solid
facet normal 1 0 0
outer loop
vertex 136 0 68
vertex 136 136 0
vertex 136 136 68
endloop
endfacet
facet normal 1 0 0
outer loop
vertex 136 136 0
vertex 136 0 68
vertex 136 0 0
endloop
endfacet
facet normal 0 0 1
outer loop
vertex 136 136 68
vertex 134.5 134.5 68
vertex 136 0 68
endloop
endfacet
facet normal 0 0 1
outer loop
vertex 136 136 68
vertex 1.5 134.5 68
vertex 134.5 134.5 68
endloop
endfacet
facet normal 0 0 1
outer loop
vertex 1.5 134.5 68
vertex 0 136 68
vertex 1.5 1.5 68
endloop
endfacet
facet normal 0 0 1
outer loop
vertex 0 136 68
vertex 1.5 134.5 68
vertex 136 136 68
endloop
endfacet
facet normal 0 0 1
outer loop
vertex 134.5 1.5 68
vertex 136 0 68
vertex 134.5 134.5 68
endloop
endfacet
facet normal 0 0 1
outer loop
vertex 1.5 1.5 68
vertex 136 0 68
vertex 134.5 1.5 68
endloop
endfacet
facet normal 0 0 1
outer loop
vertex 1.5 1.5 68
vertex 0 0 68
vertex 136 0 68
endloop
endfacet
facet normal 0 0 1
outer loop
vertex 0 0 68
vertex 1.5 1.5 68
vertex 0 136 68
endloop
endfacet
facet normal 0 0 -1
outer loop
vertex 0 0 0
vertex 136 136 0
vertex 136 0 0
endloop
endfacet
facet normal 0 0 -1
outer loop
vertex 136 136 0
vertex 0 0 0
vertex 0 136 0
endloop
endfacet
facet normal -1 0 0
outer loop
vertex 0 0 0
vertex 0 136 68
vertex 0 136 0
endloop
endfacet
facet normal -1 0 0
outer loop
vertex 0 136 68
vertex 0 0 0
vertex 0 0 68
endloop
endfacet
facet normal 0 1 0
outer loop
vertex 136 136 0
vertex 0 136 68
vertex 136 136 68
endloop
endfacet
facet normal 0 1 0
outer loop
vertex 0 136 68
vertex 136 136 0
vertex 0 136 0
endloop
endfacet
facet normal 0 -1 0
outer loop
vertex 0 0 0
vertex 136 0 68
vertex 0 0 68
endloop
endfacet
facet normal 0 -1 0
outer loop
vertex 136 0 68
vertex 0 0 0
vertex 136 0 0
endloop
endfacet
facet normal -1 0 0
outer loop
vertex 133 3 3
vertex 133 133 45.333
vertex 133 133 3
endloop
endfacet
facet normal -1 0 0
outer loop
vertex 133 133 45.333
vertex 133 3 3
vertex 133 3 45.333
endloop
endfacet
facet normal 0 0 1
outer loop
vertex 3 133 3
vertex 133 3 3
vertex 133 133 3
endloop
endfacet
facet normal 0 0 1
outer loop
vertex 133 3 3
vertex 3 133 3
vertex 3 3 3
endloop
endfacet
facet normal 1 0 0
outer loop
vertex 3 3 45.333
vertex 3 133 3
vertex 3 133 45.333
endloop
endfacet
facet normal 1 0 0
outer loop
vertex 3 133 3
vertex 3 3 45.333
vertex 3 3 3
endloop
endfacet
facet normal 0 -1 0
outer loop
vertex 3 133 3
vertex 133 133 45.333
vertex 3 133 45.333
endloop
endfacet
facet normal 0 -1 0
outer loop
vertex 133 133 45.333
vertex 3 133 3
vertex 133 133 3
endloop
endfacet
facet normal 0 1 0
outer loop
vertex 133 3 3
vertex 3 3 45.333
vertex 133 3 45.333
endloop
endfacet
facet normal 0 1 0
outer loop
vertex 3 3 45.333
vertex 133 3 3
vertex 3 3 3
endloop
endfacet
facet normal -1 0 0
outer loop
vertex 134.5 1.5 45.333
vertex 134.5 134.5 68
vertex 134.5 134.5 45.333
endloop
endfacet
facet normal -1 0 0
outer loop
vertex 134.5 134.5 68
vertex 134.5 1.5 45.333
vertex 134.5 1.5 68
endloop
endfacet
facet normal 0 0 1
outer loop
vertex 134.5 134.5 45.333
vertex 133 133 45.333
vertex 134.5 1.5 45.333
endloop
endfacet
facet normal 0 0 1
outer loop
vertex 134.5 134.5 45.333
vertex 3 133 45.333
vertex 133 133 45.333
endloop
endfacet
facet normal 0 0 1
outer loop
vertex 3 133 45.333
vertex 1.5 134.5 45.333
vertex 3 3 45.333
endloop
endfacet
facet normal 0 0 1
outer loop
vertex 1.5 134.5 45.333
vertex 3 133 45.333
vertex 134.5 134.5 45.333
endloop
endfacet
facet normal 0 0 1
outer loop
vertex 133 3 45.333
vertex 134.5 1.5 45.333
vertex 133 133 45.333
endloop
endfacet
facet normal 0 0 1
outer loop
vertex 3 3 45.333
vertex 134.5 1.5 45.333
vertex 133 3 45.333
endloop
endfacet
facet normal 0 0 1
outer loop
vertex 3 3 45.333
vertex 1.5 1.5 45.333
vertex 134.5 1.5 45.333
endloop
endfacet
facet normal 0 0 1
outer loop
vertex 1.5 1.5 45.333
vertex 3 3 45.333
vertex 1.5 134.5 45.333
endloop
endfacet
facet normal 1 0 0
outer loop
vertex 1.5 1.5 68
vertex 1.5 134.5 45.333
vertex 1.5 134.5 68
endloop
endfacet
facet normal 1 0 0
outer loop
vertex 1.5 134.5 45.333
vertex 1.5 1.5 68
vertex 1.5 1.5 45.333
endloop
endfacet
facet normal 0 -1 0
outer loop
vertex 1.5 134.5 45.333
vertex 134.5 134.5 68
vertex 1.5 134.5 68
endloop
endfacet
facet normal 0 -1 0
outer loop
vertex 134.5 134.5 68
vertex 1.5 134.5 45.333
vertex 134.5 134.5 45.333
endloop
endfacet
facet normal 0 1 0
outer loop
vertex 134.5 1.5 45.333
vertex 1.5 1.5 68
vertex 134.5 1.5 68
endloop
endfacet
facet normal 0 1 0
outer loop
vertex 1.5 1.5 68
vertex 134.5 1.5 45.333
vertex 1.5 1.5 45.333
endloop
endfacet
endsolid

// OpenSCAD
outside = 136;
thickness = 3;
lip_z = outside / 6;

difference() {
    cube([outside, outside, (outside / 2)]);
    translate([thickness, thickness, thickness]) {
        cube(outside - (thickness * 2));
    }
    translate([(thickness / 2), (thickness / 2), ((outside / 2) - lip_z)]) {
        cube([(outside - thickness), (outside - thickness), outside]);
    }
}
 
